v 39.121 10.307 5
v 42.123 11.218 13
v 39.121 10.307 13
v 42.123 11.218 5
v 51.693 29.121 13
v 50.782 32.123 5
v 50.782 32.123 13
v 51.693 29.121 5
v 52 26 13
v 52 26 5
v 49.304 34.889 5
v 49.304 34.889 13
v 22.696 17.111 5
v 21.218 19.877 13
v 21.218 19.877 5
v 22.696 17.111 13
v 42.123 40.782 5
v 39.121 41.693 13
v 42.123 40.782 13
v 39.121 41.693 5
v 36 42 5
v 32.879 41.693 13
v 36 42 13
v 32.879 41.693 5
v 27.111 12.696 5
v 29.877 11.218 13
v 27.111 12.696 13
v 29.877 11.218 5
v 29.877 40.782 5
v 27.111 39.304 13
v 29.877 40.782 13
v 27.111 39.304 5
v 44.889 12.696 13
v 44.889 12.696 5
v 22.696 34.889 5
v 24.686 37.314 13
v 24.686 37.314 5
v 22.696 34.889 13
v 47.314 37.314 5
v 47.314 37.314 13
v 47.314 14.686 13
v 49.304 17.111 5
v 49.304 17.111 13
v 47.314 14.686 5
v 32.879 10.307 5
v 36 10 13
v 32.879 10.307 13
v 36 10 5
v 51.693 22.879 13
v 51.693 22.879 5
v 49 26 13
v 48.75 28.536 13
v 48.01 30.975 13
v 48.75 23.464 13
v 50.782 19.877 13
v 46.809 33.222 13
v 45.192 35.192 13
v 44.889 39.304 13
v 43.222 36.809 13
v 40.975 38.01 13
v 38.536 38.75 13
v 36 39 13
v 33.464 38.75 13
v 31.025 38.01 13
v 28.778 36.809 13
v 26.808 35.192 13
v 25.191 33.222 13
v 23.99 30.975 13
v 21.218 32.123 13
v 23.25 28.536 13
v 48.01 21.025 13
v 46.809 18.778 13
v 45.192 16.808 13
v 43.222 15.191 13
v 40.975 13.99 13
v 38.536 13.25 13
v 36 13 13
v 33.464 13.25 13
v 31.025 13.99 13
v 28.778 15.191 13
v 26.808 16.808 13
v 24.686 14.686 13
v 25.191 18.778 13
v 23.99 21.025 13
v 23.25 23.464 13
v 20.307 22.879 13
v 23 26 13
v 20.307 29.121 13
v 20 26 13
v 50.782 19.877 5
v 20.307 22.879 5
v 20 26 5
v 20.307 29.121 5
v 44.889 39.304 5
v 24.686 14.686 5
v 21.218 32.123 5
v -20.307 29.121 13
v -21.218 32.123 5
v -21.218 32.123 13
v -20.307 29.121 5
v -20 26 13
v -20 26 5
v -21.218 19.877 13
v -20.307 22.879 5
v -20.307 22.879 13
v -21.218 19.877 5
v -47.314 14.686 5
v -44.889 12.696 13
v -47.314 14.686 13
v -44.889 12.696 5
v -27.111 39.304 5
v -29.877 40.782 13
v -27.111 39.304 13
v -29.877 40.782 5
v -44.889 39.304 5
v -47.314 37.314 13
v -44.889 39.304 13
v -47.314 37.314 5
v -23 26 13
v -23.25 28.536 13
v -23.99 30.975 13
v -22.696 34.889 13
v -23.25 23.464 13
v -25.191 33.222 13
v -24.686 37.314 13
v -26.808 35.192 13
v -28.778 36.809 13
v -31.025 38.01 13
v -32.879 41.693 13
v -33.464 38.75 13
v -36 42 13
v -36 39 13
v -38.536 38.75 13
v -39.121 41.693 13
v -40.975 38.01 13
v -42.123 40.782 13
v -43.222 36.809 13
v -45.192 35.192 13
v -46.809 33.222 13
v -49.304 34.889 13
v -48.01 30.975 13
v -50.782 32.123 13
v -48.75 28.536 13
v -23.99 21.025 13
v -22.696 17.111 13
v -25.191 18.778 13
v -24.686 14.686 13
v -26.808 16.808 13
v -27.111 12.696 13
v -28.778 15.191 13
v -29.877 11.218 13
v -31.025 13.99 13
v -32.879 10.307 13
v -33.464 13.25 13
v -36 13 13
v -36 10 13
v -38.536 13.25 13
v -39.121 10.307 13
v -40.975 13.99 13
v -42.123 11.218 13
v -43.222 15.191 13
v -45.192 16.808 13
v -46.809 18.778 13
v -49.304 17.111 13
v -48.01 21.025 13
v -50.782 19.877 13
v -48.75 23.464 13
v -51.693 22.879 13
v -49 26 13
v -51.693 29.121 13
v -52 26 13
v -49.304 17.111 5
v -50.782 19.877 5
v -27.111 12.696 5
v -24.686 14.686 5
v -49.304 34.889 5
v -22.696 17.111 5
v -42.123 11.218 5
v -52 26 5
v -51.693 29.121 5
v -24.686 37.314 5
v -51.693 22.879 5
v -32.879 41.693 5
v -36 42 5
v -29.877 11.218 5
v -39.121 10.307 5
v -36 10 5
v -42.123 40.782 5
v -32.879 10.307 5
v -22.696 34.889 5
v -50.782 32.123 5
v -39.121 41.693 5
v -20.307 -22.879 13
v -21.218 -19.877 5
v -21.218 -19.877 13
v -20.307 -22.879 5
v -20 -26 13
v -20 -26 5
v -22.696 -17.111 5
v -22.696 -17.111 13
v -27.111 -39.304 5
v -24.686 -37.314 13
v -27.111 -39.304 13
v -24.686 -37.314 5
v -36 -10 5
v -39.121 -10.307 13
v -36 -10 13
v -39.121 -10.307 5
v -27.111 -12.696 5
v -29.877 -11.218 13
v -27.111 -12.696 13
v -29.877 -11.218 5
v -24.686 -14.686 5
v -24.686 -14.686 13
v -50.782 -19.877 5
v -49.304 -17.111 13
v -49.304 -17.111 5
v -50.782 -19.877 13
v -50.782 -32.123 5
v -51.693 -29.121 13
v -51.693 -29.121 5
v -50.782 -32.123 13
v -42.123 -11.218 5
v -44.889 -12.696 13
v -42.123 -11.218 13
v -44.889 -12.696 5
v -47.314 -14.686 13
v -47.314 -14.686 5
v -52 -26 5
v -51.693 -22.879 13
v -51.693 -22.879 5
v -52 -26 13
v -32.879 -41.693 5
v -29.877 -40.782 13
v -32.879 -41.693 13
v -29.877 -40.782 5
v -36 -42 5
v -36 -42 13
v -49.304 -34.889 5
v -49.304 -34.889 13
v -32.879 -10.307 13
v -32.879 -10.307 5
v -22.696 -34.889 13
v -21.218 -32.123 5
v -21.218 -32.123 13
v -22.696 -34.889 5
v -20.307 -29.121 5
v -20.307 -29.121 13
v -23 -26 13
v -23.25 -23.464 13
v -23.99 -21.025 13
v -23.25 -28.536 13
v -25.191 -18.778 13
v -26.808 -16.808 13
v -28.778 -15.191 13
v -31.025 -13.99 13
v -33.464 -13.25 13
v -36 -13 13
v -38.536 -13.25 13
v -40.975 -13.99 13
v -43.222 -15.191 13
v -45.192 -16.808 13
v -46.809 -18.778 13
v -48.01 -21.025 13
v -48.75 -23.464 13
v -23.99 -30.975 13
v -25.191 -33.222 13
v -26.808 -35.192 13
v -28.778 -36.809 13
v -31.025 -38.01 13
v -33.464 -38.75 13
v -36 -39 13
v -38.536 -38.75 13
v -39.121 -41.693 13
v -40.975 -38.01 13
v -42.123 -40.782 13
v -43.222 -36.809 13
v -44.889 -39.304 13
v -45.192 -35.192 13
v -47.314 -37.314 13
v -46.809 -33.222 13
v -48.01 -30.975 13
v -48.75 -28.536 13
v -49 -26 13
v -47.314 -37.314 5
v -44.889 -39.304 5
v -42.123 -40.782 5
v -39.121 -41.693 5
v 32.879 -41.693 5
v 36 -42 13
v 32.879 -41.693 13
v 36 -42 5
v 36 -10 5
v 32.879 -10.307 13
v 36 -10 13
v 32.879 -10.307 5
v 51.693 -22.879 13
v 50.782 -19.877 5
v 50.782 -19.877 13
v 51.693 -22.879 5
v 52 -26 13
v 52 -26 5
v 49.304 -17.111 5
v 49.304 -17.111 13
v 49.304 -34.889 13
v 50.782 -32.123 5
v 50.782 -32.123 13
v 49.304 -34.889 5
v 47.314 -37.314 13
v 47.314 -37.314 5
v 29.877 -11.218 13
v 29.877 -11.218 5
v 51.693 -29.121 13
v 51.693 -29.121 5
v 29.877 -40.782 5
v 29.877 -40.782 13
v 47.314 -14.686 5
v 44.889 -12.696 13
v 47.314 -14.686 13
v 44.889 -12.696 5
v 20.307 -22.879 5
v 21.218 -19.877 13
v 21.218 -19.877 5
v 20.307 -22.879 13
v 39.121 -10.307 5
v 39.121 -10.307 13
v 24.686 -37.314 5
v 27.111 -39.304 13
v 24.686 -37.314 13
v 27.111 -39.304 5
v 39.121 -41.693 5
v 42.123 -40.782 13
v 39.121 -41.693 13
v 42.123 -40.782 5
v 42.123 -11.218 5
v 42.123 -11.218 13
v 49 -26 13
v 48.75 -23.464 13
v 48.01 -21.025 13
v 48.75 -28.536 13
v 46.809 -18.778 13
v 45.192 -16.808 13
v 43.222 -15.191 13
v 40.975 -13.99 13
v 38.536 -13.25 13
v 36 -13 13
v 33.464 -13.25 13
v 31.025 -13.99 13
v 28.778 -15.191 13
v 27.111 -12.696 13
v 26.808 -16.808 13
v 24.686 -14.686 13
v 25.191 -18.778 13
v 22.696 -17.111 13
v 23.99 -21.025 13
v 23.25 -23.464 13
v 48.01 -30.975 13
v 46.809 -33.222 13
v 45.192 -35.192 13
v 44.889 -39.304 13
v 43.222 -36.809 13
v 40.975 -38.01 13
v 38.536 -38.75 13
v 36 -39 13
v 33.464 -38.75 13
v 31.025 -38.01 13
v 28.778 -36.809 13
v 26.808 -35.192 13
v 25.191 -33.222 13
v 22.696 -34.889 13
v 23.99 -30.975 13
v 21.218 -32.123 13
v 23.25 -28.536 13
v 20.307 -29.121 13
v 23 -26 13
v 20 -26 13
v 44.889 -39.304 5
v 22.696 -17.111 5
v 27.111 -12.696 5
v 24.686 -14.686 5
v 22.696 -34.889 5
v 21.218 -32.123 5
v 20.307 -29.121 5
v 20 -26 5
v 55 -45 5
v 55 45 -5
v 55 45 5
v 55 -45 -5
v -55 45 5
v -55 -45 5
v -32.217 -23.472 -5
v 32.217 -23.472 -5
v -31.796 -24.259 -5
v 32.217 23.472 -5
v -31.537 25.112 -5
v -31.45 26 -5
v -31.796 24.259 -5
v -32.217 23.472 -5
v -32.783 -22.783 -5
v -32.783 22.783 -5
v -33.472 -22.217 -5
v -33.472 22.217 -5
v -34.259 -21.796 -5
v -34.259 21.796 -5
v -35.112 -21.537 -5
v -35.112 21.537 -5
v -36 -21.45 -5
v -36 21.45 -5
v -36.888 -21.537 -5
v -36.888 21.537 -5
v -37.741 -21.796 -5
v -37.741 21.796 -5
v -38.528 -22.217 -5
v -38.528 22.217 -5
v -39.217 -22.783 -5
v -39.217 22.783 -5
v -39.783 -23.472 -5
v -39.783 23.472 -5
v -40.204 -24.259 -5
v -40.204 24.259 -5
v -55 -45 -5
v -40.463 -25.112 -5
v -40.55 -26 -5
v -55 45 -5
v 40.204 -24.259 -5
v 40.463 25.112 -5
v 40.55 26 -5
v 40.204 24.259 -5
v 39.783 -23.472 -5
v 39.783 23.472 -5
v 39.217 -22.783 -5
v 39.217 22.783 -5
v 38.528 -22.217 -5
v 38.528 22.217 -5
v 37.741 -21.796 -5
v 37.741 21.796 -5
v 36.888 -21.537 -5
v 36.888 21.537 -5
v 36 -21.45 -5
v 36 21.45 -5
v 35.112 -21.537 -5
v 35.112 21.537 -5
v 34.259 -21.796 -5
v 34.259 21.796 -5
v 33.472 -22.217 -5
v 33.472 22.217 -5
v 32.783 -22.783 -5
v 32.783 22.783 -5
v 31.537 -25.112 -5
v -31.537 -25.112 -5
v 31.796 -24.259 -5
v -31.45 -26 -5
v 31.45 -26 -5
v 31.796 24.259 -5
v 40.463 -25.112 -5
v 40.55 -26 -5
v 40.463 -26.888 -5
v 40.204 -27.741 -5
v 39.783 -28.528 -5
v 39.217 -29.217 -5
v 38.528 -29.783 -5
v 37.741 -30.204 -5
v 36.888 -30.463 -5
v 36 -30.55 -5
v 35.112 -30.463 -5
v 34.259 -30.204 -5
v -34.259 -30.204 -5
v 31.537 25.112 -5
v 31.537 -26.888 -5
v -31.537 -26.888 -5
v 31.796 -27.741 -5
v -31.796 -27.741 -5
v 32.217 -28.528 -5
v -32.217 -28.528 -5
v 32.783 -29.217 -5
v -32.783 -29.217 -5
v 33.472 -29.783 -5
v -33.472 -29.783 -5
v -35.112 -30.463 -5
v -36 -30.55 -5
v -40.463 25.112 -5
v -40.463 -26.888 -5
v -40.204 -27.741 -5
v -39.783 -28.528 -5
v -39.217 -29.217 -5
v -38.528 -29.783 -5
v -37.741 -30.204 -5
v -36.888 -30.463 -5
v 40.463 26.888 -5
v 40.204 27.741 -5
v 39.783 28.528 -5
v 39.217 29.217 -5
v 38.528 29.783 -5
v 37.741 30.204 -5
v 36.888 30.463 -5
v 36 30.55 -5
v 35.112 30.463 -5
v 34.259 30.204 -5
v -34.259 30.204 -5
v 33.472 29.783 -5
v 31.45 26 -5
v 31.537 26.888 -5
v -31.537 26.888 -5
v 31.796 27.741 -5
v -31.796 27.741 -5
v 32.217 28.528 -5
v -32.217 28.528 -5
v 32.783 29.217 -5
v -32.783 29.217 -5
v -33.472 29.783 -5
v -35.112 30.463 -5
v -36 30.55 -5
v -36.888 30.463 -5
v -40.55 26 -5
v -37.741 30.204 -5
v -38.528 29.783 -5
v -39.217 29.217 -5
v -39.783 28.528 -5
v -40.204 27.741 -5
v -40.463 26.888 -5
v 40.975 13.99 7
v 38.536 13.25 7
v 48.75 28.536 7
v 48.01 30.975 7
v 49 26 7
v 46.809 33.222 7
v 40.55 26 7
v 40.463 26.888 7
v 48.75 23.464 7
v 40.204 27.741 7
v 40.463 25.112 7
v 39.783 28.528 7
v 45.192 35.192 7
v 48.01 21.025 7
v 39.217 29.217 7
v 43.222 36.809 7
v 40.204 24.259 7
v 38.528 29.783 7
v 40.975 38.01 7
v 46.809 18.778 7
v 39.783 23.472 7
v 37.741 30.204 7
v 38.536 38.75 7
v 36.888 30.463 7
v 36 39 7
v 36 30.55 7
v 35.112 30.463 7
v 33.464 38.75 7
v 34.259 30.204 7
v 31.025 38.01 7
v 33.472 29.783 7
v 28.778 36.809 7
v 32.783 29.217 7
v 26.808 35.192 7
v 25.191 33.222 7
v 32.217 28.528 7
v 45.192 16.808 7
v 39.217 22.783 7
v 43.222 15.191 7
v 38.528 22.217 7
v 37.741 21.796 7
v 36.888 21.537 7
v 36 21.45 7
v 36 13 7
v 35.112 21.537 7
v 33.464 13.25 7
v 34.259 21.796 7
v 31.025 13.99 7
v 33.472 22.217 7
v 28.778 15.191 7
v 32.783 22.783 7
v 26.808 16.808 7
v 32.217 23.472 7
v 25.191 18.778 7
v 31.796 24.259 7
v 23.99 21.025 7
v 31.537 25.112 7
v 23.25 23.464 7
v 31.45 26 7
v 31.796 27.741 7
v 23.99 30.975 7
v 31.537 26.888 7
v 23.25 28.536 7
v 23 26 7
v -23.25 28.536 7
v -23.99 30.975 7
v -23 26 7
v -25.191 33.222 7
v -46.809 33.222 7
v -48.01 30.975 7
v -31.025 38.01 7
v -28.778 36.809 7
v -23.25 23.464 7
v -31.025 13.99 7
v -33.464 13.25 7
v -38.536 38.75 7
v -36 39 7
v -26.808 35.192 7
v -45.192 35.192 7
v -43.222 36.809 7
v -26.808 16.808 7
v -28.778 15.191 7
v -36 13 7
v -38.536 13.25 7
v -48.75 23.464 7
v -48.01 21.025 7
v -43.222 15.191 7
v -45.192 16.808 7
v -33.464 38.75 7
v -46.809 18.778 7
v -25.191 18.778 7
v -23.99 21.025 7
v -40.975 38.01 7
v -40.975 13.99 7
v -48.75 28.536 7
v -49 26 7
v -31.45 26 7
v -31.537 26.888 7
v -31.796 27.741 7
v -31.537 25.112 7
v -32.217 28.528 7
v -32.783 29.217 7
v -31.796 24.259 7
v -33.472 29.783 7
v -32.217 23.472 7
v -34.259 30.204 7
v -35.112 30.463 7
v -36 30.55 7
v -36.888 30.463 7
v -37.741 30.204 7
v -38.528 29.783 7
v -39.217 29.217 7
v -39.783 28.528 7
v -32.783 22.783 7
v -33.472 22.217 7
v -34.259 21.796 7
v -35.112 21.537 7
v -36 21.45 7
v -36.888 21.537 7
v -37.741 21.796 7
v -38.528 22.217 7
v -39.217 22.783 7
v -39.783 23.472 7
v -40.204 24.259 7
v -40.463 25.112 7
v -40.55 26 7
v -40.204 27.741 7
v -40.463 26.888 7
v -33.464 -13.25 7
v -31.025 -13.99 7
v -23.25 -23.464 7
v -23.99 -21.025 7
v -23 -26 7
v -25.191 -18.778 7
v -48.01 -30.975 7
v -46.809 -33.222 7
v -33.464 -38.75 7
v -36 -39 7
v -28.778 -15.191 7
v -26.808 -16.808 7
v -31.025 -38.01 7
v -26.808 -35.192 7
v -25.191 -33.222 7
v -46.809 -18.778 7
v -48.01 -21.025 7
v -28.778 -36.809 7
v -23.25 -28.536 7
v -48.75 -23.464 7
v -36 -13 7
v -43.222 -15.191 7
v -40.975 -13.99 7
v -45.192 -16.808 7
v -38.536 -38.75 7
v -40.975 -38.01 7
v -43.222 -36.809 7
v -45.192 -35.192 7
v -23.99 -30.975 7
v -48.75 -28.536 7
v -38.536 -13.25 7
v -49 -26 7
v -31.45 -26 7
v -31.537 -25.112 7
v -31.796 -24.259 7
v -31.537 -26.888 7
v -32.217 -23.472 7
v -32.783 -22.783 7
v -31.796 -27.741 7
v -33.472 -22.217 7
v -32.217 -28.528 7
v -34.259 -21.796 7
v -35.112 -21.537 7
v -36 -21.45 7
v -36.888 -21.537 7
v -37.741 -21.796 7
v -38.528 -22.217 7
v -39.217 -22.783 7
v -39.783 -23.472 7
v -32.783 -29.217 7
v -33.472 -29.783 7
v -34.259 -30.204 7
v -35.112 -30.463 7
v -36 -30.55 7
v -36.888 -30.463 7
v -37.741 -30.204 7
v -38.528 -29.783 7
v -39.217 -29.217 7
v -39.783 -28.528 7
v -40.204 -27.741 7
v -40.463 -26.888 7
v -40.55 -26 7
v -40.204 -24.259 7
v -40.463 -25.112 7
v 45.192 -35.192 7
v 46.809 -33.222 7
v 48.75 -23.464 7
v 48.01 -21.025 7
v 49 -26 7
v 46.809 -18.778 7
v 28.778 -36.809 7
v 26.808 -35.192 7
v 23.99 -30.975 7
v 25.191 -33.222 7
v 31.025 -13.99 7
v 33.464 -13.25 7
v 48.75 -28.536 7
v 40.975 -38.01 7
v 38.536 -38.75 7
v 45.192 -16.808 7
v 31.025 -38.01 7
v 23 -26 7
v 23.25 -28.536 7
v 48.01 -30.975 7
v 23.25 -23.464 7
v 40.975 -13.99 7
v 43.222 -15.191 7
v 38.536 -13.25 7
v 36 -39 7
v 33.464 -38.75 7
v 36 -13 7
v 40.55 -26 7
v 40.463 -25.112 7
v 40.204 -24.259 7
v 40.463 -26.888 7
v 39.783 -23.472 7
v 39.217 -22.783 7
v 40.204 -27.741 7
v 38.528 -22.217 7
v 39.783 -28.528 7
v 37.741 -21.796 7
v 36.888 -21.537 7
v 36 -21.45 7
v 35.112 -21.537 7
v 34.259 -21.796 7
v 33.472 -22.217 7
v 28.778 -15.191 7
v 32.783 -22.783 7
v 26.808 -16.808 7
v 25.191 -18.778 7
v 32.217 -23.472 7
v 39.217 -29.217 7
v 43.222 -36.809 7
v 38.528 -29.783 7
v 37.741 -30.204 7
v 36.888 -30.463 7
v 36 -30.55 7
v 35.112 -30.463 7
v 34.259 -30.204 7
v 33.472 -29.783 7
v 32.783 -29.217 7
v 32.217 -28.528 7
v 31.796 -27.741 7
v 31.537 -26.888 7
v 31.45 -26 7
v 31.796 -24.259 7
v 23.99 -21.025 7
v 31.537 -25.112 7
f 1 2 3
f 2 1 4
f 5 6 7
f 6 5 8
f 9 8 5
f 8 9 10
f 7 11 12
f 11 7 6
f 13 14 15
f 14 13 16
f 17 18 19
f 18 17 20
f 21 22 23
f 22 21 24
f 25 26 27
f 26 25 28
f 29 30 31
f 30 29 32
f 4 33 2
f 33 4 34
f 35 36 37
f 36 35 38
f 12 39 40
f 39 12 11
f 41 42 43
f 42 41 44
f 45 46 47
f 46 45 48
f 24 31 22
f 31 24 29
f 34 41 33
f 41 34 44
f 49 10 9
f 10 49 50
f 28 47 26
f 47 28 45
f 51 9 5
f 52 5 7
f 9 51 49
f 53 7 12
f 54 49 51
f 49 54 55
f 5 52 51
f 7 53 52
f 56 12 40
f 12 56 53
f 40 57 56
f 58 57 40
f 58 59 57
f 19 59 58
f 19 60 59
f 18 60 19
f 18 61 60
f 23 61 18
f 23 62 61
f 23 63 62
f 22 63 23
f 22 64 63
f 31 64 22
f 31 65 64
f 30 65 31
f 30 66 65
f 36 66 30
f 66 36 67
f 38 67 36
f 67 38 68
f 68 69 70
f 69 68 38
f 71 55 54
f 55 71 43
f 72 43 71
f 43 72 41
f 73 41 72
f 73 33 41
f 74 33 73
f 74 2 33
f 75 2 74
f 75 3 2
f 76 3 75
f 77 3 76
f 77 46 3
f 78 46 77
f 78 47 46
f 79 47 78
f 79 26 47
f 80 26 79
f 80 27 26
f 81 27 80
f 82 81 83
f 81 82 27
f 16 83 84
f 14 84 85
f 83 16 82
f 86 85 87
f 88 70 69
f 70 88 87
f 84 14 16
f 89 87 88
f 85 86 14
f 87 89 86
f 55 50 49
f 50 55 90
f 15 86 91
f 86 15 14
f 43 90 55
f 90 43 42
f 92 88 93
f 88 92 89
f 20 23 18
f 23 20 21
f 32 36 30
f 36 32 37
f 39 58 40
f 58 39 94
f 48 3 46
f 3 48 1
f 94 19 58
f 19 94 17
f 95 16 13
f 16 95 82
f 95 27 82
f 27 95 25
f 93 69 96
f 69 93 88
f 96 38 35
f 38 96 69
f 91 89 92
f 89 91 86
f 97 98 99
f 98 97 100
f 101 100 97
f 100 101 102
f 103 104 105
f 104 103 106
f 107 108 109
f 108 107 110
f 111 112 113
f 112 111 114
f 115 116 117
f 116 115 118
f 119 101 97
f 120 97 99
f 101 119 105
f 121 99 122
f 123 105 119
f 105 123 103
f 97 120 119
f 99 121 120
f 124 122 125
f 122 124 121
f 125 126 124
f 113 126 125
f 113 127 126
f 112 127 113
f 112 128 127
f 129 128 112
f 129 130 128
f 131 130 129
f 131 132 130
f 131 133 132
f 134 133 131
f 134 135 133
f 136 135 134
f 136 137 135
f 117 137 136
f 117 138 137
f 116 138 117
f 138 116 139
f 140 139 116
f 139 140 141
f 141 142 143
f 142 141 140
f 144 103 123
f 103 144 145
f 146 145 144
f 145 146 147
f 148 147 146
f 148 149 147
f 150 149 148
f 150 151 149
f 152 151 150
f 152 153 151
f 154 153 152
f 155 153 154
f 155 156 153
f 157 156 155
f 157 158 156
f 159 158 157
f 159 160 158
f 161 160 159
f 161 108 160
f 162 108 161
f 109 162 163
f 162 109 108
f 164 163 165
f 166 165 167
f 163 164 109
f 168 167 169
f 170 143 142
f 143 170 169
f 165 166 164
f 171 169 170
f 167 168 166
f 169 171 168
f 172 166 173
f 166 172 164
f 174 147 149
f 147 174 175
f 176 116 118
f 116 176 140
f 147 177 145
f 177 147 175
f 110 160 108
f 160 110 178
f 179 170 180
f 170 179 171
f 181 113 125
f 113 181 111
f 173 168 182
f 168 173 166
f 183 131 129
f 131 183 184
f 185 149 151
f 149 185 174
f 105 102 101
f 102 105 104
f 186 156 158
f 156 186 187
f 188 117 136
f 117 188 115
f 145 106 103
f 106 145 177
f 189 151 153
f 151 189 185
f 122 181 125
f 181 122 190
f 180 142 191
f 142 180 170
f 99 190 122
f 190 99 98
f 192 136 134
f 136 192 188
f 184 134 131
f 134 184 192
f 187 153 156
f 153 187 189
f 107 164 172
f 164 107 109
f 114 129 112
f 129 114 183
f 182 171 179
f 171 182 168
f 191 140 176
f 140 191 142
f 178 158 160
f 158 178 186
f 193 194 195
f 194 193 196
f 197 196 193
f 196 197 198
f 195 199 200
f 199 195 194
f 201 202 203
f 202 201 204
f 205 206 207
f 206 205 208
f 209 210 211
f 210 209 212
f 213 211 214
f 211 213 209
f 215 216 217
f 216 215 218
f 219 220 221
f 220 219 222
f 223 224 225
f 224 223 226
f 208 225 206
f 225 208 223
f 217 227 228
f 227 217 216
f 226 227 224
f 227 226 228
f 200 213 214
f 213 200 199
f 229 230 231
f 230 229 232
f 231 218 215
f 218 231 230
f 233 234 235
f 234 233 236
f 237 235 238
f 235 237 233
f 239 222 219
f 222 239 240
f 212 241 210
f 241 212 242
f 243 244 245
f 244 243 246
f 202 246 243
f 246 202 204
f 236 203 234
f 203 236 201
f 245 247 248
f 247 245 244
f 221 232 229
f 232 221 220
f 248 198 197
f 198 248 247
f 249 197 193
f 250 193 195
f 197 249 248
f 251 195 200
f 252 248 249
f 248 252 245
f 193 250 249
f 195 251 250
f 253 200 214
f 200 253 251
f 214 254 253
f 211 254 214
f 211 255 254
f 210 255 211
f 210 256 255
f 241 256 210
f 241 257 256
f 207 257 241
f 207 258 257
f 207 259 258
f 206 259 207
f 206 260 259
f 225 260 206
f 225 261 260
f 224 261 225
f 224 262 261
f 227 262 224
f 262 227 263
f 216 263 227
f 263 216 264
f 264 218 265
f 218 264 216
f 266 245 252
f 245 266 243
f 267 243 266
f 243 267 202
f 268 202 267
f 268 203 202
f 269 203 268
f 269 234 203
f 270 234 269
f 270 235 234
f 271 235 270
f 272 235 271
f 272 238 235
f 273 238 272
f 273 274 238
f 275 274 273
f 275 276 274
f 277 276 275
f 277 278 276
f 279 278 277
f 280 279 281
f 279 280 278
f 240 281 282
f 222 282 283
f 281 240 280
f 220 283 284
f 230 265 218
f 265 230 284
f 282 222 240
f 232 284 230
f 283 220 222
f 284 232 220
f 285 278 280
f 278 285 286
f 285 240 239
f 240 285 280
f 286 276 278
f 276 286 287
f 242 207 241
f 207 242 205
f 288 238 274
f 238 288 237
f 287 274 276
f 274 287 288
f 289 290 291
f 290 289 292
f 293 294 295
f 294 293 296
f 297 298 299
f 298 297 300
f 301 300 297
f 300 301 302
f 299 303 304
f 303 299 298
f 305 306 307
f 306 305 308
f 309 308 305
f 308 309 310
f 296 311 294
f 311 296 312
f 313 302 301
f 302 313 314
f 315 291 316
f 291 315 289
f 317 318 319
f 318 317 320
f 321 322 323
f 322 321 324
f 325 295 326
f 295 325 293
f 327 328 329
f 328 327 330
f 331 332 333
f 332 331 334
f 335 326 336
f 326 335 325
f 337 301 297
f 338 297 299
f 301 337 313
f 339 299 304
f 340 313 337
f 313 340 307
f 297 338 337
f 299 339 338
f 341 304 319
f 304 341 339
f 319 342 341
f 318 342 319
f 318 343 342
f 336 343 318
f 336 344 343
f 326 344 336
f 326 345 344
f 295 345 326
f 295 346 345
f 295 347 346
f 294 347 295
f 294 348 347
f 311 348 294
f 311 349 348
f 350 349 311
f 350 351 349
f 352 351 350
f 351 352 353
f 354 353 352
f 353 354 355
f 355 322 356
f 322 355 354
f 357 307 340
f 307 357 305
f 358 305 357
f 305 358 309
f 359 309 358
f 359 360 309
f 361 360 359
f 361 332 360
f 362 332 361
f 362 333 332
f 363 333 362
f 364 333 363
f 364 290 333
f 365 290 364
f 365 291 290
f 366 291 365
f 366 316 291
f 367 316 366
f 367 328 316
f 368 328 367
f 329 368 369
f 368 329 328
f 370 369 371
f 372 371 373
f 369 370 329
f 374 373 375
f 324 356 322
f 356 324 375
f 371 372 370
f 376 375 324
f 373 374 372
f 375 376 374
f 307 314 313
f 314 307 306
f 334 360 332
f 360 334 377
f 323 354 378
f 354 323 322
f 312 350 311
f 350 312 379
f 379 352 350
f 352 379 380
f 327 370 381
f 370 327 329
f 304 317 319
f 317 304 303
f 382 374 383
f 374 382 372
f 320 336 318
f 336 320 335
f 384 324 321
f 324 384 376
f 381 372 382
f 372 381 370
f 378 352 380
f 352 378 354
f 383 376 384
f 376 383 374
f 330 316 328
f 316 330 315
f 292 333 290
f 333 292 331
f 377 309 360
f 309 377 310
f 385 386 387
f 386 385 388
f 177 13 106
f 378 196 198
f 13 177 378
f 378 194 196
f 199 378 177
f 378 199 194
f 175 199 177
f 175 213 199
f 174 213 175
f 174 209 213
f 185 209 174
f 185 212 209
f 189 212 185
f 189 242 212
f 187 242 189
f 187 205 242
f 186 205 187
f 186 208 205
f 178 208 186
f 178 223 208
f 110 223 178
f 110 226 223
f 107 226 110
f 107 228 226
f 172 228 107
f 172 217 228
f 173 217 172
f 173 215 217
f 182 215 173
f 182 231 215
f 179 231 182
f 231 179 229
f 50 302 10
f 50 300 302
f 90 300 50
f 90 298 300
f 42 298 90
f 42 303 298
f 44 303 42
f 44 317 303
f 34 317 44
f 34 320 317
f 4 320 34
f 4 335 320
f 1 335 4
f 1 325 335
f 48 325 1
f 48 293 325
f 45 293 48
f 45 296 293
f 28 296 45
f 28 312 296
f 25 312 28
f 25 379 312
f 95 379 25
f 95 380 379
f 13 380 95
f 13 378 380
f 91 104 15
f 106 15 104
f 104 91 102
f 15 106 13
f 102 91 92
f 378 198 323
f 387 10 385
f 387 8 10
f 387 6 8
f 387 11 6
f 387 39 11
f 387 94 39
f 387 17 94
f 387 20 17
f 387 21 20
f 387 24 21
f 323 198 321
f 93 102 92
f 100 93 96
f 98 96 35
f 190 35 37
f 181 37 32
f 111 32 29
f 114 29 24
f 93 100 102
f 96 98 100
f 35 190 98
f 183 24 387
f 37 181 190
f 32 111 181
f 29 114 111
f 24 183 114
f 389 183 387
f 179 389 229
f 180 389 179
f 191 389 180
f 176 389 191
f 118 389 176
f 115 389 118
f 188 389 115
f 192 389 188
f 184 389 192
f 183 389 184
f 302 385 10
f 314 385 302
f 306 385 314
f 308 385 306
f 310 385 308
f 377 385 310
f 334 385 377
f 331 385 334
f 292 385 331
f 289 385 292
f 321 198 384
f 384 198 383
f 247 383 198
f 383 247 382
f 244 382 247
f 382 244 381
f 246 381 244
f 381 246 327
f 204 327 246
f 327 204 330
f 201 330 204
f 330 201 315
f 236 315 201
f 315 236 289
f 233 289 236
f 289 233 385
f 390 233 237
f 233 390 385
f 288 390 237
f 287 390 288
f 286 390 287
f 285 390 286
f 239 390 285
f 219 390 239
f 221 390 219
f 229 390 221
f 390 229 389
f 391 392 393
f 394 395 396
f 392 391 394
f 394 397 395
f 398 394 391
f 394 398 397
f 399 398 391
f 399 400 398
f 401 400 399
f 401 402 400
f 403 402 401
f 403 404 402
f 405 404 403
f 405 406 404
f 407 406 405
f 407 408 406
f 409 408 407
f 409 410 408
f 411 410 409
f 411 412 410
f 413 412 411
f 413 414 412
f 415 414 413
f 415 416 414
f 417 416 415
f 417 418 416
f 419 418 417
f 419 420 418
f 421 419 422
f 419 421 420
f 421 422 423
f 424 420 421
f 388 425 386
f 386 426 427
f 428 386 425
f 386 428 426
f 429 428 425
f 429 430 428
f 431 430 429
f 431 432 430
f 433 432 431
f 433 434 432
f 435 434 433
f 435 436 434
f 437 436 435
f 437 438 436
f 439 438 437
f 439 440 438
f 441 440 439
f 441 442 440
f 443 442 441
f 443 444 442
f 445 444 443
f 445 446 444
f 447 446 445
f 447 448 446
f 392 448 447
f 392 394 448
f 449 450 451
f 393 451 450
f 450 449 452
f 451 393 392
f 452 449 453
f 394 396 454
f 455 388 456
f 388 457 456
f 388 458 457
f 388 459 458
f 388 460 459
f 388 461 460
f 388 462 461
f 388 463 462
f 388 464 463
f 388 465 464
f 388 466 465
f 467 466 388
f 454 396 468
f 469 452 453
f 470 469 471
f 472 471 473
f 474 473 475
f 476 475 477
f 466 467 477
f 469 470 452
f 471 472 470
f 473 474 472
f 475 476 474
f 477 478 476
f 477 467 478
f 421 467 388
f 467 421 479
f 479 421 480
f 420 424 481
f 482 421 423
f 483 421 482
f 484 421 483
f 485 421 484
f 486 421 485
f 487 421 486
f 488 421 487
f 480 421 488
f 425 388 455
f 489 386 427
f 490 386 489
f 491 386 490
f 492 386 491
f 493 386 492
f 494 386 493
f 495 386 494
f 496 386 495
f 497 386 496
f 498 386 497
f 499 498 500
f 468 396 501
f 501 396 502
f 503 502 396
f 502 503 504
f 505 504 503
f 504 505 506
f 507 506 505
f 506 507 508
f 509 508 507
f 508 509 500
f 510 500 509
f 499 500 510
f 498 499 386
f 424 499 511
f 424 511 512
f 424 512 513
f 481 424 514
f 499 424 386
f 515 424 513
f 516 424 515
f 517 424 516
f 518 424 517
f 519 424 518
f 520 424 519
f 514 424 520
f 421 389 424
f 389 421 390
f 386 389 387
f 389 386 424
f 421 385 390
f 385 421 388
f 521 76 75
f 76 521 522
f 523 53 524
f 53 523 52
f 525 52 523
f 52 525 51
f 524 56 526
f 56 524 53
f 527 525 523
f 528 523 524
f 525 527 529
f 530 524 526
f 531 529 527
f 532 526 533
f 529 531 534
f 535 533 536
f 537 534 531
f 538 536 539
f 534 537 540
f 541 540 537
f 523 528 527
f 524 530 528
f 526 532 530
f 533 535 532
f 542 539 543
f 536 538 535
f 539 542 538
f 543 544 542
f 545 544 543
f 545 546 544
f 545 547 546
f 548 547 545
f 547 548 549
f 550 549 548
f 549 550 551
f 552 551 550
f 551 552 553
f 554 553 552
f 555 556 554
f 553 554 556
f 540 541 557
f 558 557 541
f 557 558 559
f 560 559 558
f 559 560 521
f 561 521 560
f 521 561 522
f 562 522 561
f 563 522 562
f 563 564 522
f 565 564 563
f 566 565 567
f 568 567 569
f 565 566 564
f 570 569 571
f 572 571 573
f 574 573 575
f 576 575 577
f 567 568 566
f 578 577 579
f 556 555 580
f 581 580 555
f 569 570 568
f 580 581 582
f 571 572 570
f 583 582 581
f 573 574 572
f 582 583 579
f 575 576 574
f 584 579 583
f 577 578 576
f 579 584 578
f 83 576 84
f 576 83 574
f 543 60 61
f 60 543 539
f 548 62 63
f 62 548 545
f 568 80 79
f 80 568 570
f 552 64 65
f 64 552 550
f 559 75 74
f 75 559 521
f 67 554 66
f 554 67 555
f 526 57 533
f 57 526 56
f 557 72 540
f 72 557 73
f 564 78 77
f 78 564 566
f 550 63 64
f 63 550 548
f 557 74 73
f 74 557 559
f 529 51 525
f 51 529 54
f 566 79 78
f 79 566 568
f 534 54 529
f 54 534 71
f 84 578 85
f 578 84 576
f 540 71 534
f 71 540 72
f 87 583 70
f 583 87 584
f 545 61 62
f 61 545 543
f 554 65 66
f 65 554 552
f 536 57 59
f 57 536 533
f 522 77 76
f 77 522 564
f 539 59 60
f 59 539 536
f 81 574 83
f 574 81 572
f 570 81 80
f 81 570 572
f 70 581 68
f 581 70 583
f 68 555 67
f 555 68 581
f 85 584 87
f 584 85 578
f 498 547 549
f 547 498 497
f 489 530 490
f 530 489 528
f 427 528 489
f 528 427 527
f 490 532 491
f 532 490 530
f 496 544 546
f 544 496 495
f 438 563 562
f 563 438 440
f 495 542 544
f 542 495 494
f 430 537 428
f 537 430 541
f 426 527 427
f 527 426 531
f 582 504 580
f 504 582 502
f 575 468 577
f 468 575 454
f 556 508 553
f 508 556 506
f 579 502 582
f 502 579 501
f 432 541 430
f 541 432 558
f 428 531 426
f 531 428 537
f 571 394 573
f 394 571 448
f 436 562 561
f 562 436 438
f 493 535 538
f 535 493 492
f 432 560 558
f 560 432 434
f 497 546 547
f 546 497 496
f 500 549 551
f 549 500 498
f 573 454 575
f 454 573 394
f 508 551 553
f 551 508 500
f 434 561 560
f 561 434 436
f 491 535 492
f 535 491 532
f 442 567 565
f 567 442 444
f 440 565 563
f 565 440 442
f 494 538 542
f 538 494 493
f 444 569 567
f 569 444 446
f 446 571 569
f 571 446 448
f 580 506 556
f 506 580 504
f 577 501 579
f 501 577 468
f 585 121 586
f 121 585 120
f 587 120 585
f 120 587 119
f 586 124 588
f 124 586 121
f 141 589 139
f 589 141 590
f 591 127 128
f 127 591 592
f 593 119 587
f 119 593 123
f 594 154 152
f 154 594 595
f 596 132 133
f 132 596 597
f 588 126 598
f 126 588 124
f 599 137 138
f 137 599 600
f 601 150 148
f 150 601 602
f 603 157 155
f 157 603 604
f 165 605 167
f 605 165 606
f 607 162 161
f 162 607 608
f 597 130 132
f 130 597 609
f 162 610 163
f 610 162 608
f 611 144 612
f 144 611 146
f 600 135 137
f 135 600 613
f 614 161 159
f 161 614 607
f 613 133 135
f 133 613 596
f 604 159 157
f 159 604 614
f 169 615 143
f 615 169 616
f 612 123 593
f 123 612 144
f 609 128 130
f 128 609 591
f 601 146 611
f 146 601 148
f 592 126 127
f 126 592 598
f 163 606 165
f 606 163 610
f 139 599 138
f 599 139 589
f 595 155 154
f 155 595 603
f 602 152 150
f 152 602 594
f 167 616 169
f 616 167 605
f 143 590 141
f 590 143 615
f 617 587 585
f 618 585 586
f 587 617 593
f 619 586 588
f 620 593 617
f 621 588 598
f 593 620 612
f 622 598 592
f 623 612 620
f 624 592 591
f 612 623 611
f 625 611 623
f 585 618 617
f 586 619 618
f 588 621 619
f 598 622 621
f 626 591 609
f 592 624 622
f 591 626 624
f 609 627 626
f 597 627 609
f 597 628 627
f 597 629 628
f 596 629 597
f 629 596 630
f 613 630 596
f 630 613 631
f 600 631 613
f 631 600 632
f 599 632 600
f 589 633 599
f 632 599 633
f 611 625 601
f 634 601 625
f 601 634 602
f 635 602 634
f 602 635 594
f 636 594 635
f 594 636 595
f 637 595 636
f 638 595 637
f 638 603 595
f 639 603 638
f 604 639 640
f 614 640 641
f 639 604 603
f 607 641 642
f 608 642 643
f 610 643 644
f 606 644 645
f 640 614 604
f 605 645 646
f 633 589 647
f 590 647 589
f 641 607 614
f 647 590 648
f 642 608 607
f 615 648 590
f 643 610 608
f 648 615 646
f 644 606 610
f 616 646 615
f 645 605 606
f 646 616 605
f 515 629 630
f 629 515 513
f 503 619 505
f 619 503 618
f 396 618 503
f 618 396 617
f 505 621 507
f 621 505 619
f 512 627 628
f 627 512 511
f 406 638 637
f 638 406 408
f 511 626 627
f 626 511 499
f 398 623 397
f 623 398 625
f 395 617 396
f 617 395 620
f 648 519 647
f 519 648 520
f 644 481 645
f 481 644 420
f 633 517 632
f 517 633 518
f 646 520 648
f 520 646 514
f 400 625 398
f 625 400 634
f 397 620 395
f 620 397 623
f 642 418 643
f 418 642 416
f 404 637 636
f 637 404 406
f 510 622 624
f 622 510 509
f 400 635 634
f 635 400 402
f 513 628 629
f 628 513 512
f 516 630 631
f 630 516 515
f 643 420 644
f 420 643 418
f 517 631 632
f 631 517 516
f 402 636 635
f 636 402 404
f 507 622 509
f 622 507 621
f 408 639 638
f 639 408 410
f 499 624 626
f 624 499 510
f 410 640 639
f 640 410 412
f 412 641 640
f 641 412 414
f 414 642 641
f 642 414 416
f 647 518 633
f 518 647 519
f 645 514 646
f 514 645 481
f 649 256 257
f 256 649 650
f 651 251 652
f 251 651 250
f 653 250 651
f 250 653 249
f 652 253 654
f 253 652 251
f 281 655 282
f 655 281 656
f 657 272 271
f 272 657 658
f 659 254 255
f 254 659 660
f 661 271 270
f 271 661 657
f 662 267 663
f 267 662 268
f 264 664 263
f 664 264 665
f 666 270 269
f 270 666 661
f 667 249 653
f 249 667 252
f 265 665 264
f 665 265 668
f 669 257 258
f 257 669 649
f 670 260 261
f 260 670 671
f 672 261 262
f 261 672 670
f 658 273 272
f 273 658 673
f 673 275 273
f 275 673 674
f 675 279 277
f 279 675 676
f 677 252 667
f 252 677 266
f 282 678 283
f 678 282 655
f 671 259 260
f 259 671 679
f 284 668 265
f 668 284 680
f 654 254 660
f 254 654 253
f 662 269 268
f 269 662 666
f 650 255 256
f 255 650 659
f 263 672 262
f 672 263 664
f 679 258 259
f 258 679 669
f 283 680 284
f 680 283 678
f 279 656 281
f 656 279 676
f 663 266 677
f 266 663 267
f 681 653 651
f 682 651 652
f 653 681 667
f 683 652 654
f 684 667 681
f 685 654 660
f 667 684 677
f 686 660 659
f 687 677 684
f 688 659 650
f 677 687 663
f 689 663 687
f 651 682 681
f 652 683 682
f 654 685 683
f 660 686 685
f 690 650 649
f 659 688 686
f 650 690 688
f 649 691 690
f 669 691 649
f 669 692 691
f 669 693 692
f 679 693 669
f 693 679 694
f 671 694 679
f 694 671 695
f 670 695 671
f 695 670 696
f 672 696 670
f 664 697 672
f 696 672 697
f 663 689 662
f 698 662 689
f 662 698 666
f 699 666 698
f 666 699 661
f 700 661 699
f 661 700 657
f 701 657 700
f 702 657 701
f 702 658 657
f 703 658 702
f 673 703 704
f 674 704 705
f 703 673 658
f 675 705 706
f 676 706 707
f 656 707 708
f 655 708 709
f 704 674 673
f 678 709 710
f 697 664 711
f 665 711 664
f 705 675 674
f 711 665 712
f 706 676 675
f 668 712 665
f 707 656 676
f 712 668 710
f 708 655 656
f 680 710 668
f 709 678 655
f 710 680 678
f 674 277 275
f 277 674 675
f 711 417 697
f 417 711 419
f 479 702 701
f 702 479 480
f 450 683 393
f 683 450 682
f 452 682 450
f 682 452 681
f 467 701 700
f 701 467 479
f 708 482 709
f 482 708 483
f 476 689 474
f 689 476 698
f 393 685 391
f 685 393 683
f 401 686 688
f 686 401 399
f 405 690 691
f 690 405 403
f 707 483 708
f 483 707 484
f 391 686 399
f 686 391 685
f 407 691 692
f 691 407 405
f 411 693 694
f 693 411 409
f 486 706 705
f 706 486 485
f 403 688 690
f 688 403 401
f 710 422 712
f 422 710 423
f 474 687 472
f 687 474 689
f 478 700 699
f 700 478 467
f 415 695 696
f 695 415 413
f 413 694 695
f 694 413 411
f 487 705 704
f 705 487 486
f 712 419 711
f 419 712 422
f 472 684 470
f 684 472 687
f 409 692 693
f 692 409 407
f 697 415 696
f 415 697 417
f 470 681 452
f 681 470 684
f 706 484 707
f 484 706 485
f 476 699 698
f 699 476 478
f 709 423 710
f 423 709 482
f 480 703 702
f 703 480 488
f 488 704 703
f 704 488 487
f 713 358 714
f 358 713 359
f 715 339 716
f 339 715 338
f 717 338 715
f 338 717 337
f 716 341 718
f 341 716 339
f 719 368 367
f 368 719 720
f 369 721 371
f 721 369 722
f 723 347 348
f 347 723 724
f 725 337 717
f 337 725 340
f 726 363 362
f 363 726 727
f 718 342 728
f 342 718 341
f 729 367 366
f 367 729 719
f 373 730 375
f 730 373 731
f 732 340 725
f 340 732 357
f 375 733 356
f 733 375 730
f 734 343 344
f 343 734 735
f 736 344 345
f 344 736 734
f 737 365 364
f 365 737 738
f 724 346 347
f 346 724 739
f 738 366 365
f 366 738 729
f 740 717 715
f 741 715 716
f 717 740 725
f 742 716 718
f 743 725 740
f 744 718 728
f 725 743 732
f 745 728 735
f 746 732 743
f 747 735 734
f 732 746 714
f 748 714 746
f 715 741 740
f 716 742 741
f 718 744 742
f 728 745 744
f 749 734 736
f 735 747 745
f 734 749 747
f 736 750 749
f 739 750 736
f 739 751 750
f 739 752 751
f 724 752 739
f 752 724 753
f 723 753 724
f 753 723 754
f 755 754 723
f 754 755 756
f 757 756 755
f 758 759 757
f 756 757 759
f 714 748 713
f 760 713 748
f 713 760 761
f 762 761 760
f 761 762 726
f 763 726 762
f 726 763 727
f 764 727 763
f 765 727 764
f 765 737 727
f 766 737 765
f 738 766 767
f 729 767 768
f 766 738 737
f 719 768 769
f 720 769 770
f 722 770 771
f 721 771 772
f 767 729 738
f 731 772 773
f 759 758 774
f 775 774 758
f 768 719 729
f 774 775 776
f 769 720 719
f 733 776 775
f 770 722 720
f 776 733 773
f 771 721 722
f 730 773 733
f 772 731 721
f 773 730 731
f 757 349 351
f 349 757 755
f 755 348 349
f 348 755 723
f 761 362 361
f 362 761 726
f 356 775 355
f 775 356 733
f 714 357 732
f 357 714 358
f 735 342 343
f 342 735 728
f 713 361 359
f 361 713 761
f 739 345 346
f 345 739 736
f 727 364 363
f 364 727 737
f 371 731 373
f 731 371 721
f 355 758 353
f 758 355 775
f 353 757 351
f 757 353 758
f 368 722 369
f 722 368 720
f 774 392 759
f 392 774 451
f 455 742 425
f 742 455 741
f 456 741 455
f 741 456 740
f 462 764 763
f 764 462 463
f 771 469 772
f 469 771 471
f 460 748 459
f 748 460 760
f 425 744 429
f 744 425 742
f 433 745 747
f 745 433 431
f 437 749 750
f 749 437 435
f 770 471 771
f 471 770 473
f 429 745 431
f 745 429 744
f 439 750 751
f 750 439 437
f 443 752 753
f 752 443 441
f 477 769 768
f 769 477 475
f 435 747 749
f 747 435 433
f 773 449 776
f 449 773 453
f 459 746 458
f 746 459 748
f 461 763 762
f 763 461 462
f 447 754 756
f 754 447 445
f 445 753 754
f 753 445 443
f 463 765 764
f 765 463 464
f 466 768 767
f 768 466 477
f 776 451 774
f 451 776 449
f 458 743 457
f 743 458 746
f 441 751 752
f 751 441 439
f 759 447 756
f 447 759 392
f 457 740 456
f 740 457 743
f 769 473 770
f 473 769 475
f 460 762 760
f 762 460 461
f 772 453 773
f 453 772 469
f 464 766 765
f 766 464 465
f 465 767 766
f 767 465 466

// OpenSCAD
$fn = 32;

// ----------------------------------------------------------------------
// Socket pad plate
// bosses with counterbored sockets for the screws
// ----------------------------------------------------------------------

// --- parameters (mm) ---
base_t = 10;            // base plate thickness
boss_h = 8;             // boss height above the base plate
boss_d = 32;            // boss diameter
socket_d = 26;          // socket diameter
socket_depth = 6;       // socket depth from the boss face
bolt_d = 9.1;           // screw clearance hole through the socket floor
plate = [110, 90, 10];  // overall size (x, y, z)
edge = 19;              // boss centre offset from the plate edge
pads = 4;               // boss count, one per corner

// --- derived feature positions (mm) ---
height = base_t + boss_h;        // = 18   overall height of the part
corner_x = plate[0] / 2 - edge;  // = 36   boss centre X
corner_y = plate[1] / 2 - edge;  // = 26   boss centre Y
feature_centers = [
  [corner_x, corner_y],
  [-corner_x, corner_y],
  [-corner_x, -corner_y],
  [corner_x, -corner_y]
];   // boss centres: sockets, holes and the pads themselves are placed from here

// base plate, bosses on feature_centers, socket + through hole in each
difference() {
  union() {
    cube(plate, center = true);
    for (centre = feature_centers)
      translate([centre[0], centre[1], plate[2] / 2 - 1])
        cylinder(d = boss_d, h = boss_h + 1);
  }
  for (centre = feature_centers) {
    translate([centre[0], centre[1], plate[2] / 2 + boss_h - socket_depth])
      cylinder(d = socket_d, h = socket_depth + 1);
    translate([centre[0], centre[1], -height])
      cylinder(d = bolt_d, h = 2 * height + 2);  // through the socket floor
  }
}
